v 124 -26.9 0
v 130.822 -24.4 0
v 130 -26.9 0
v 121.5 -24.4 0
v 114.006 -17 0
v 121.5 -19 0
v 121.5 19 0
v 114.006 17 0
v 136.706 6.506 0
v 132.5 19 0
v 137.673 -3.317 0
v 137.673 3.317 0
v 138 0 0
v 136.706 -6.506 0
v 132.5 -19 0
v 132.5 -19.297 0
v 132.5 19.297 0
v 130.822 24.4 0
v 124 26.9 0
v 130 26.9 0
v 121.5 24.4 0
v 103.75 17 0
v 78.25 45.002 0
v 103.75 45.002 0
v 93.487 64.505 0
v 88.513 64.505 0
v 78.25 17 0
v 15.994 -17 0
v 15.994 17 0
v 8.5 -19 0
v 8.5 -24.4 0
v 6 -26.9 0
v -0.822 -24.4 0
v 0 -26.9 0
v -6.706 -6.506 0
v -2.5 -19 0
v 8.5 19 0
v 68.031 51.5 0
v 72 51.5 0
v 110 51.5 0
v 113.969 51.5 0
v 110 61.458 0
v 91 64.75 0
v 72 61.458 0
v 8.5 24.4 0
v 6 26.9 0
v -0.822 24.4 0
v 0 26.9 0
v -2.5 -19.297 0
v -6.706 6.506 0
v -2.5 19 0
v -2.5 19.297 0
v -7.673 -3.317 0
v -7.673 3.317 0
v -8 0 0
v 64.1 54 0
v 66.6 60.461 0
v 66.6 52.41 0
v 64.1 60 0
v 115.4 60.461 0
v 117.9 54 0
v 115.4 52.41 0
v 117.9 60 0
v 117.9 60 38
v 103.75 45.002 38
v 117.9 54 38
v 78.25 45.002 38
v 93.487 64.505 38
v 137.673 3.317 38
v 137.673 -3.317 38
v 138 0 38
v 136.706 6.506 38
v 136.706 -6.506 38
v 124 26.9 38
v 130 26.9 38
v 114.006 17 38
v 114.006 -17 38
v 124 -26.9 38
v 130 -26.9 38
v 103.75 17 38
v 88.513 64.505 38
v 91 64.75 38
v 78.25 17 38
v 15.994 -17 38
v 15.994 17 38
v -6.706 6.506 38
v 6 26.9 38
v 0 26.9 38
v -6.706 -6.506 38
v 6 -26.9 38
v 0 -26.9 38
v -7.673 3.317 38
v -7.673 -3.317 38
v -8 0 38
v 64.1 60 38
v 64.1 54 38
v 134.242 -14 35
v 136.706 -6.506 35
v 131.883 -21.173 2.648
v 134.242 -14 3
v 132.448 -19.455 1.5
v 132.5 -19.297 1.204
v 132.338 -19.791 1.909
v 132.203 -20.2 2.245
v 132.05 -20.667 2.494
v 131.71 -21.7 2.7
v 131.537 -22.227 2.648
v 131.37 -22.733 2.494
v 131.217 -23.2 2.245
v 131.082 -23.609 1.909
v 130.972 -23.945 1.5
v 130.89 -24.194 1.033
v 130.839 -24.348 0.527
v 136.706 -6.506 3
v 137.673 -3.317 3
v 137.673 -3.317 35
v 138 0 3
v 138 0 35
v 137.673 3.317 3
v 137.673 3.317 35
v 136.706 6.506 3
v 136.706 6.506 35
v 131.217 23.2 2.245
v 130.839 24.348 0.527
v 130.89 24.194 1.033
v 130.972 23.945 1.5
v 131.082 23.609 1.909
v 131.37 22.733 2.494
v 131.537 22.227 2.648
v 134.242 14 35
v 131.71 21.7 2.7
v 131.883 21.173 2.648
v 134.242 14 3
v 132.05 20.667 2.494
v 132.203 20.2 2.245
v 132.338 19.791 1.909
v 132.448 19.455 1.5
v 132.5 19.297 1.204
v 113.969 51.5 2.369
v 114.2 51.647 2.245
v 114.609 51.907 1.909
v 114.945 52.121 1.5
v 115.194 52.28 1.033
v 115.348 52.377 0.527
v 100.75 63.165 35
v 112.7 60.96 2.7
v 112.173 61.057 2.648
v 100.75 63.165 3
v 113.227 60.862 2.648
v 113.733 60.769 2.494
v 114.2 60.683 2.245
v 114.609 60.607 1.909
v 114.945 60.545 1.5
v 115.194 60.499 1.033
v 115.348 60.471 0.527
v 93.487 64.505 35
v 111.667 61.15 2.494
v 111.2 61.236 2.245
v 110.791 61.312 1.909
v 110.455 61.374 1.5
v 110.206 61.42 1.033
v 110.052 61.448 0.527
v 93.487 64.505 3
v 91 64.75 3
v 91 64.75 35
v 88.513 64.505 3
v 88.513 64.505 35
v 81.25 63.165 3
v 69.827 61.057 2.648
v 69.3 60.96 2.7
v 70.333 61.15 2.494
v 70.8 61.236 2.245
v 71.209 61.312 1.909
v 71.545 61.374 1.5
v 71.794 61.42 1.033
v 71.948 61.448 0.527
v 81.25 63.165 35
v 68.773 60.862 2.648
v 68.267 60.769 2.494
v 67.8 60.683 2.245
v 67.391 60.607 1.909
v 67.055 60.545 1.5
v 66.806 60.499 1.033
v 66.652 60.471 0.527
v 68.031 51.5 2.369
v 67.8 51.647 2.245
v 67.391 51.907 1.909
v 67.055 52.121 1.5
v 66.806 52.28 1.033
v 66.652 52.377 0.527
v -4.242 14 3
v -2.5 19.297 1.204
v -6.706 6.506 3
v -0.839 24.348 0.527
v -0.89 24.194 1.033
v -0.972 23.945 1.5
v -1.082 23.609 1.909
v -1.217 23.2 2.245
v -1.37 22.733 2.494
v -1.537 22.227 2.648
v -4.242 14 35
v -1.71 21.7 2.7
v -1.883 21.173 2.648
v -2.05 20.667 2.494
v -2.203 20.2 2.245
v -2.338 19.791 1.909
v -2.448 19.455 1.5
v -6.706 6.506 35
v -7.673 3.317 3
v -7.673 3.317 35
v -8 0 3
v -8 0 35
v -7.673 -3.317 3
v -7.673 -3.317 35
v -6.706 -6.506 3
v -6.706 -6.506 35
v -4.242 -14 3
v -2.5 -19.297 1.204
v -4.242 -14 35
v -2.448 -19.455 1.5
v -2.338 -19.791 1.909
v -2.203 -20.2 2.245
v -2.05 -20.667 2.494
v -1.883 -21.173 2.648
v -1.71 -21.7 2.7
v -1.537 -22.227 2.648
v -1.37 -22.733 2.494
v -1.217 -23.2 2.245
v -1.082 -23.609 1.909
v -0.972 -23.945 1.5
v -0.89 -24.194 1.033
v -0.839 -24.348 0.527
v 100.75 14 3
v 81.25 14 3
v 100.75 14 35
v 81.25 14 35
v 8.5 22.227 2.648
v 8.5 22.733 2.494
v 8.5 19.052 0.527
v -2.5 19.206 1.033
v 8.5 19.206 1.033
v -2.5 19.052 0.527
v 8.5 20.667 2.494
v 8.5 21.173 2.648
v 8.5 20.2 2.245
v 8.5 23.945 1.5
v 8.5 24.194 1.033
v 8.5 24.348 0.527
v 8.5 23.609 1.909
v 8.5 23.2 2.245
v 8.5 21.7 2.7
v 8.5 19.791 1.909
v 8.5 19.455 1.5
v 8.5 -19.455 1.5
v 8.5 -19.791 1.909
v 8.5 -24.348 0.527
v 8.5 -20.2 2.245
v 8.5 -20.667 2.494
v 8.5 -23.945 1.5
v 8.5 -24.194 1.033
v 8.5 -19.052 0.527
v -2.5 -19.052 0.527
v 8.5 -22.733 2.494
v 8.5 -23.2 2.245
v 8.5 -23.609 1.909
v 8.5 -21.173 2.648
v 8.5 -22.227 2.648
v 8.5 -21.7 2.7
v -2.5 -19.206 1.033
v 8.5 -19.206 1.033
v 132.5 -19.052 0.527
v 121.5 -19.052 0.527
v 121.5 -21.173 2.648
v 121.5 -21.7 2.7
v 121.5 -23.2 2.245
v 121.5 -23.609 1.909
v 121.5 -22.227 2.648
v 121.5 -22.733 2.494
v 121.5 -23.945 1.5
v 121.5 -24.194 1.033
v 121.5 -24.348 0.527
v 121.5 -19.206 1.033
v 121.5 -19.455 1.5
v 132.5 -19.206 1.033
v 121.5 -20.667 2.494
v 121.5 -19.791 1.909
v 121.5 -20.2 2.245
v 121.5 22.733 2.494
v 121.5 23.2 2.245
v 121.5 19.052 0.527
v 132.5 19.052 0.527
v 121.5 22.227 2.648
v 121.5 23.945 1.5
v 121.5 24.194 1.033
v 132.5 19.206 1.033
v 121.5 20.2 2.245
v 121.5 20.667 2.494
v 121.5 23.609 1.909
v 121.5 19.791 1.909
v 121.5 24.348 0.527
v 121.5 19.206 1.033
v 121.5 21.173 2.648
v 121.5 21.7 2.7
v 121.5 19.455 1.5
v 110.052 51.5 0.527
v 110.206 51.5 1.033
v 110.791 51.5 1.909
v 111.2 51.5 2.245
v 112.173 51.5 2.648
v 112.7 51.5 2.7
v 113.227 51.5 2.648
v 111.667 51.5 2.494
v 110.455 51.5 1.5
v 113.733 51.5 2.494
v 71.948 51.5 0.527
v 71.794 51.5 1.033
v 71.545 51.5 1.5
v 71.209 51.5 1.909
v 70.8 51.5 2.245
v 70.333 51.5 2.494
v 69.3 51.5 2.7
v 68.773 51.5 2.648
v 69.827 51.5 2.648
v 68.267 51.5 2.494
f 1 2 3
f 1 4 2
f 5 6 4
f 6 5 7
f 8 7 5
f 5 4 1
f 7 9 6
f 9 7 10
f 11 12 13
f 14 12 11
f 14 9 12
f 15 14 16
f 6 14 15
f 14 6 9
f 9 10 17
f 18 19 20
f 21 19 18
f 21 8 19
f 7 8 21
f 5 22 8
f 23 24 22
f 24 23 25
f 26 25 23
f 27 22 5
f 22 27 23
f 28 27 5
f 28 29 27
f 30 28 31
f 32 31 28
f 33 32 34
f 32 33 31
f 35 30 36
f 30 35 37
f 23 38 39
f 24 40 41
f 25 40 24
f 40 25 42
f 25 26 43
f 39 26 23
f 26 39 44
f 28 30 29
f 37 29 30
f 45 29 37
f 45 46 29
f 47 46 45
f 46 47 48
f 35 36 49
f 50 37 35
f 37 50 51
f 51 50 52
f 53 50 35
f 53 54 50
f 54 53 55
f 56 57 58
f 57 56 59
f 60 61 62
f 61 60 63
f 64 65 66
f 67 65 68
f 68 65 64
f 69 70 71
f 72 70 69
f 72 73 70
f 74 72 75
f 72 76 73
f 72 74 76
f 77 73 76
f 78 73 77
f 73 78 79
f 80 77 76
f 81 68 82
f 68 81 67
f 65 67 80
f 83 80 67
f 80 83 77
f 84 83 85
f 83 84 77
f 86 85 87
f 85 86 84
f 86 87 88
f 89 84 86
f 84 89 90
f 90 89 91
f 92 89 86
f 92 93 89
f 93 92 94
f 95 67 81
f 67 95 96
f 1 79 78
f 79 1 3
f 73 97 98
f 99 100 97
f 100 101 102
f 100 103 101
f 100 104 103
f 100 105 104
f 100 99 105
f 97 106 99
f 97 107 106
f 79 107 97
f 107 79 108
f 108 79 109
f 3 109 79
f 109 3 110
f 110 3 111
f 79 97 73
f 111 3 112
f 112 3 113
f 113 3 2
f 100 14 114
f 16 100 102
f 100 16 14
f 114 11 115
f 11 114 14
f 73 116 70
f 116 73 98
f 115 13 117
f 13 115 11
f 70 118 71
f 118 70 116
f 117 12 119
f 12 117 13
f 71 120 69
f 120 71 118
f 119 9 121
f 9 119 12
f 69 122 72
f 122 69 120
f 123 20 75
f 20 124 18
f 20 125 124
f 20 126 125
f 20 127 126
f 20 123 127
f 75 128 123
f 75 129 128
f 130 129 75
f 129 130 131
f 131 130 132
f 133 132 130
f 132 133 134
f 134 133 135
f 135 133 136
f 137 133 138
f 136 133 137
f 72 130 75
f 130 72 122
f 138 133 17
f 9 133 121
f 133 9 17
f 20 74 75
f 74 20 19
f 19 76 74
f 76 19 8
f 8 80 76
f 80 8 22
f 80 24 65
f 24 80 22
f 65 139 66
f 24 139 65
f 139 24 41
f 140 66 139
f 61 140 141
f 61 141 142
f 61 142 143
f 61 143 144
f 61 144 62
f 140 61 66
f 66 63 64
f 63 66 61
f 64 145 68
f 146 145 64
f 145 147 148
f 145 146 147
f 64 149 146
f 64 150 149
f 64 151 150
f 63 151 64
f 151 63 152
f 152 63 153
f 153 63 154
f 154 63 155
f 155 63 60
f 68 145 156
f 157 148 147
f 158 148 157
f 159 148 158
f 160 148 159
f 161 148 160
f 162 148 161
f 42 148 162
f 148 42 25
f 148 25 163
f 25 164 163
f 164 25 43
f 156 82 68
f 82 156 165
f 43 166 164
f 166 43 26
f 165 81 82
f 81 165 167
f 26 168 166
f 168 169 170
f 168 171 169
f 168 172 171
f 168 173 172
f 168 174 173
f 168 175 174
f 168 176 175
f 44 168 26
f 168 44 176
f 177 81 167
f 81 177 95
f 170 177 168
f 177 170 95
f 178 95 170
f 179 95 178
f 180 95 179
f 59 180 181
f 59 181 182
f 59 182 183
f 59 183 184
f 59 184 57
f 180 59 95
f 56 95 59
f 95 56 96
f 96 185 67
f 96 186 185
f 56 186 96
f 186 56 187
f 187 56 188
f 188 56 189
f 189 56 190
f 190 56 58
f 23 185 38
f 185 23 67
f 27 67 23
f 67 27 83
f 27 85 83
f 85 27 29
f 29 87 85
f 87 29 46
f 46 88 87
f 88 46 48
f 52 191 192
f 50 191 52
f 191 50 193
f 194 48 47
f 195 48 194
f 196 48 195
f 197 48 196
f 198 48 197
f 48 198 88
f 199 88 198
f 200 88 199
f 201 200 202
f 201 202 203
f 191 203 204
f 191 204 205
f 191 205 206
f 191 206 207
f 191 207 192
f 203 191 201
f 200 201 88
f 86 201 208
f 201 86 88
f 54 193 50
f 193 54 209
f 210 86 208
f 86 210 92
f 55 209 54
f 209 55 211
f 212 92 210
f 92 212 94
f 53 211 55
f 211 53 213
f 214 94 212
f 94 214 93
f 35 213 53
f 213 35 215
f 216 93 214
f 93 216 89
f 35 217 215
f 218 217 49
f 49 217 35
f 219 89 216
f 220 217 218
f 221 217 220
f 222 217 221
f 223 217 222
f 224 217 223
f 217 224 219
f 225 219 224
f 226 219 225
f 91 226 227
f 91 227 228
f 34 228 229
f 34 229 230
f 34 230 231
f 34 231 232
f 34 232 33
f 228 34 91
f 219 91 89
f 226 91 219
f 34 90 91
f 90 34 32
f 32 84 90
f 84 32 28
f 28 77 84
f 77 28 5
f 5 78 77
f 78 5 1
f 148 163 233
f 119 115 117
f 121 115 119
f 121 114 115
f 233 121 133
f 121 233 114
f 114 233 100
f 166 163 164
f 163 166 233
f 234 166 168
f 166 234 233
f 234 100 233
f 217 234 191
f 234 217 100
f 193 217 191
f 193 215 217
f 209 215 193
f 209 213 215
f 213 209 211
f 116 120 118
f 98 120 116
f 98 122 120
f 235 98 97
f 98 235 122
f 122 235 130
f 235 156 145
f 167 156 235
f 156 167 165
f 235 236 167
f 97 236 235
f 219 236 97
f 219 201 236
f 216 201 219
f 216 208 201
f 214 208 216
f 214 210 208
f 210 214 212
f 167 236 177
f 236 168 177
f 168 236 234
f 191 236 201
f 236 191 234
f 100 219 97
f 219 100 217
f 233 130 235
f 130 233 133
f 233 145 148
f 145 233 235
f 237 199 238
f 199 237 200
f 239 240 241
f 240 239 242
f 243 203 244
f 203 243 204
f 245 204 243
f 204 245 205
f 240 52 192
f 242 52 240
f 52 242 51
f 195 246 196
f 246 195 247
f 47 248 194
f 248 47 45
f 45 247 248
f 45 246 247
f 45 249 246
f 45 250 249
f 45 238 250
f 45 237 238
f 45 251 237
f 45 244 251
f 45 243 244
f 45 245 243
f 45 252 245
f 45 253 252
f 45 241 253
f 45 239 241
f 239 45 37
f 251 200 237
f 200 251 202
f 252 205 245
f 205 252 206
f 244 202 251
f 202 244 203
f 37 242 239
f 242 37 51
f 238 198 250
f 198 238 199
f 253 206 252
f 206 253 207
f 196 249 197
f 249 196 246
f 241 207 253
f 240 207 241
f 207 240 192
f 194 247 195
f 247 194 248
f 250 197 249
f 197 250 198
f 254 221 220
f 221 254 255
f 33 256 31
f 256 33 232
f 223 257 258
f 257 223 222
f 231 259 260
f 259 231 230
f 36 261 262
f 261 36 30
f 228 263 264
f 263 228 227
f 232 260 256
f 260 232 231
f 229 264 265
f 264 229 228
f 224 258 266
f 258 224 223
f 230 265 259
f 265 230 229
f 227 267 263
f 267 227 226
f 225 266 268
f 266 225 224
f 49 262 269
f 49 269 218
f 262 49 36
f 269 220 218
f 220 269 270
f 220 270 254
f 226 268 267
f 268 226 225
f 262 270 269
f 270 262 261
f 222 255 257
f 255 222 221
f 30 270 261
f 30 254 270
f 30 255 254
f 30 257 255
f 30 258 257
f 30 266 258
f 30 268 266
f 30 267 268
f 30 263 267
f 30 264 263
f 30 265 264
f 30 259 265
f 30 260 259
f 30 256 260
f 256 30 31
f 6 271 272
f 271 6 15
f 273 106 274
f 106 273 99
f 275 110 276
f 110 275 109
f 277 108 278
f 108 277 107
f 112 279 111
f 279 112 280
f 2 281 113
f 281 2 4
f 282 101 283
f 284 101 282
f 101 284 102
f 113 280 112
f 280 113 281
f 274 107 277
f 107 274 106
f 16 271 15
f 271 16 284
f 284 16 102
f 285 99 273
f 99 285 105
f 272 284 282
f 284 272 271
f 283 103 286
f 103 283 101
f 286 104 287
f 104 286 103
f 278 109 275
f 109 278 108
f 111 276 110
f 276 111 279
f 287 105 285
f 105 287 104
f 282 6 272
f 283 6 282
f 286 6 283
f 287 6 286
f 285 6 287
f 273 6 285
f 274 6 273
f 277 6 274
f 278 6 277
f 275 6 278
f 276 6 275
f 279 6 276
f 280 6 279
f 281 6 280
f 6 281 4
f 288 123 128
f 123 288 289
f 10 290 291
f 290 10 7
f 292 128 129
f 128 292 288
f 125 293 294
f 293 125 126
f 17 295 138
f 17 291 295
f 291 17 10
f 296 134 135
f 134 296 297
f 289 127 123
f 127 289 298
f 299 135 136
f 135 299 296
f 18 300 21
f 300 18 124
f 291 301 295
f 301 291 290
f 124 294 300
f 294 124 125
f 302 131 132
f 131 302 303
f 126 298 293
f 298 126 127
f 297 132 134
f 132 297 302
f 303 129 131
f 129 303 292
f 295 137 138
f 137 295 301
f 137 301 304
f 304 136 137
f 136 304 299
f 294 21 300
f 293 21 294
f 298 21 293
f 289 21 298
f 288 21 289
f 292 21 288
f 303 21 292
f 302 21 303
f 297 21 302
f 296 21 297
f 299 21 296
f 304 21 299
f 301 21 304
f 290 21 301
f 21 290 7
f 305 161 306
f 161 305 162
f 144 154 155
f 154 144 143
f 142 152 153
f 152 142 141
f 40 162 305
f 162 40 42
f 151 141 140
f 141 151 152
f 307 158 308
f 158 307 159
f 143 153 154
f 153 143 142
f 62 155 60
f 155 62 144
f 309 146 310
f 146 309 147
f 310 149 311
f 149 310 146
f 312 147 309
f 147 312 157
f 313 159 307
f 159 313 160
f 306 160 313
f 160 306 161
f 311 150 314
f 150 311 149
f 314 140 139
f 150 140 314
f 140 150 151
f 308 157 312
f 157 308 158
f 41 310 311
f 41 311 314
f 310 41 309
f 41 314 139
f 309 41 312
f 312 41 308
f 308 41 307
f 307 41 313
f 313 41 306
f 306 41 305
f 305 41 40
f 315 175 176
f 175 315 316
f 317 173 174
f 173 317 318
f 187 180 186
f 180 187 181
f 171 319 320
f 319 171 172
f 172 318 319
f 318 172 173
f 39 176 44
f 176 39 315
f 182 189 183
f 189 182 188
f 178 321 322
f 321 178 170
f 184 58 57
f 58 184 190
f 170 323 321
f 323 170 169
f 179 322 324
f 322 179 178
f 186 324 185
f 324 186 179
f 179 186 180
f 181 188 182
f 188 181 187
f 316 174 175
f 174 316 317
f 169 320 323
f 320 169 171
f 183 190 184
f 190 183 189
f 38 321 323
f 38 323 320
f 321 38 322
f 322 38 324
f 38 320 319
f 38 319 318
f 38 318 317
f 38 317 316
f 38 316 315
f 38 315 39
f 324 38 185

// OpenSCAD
$fn = 32;

// ----------------------------------------------------------------------
// Air duct: 34 mm duct, 3 mm wall, 38 mm across
// ----------------------------------------------------------------------

// --- parameters (mm) ---
duct_r = 17;              // duct core radius
duct_d = 34;              // duct core diameter
wall = 3;                 // duct wall thickness
height = 38;              // duct width (extrusion height)
port_r = 26.9;            // port flange half width
port_d = 53.8;            // port flange width
port_t = 6;               // port flange thickness
bolt_d = 5.4;             // port bolt holes
bolt_offset = 21.7;       // bolt hole offset from the port axis
branch_r = 12.75;         // branch core radius
branch_d = 25.5;          // branch core diameter
branch_len = 60;          // branch length from the run axis

difference() {
  /* outer hull chain: tube with a flat flange plate at every port */
  linear_extrude(height = 38) {
    hull() {
      polygon([[0, -26.9], [0, 26.9], [6, 26.9], [6, -26.9]]);
      translate([9, 0]) circle(r = 17);
    }
    hull() {
      translate([9, 0]) circle(r = 17);
      translate([39, 0]) circle(r = 17);
    }
    hull() {
      translate([39, 0]) circle(r = 17);
      translate([91, 0]) circle(r = 17);
    }
    hull() {
      translate([91, 0]) circle(r = 17);
      translate([121, 0]) circle(r = 17);
    }
    hull() {
      translate([121, 0]) circle(r = 17);
      polygon([[130, 26.9], [130, -26.9], [124, -26.9], [124, 26.9]]);
    }
    hull() {
      translate([91, 0]) circle(r = 12.75);
      translate([91, 33]) circle(r = 12.75);
    }
    hull() {
      translate([91, 33]) circle(r = 12.75);
      translate([91, 52]) circle(r = 12.75);
    }
    hull() {
      translate([91, 52]) circle(r = 12.75);
      polygon([[64.1, 60], [117.9, 60], [117.9, 54], [64.1, 54]]);
    }
  }
  /* air passage: the same chain inset by the wall, 5 mm proud of the ports */
  translate([0, 0, 3]) linear_extrude(height = 32) {
    hull() {
      translate([-5, 0]) circle(r = 14);
      translate([39, 0]) circle(r = 14);
    }
    hull() {
      translate([39, 0]) circle(r = 14);
      translate([91, 0]) circle(r = 14);
    }
    hull() {
      translate([91, 0]) circle(r = 14);
      translate([135, 0]) circle(r = 14);
    }
    hull() {
      translate([91, 0]) circle(r = 9.75);
      translate([91, 33]) circle(r = 9.75);
    }
    hull() {
      translate([91, 33]) circle(r = 9.75);
      translate([91, 65]) circle(r = 9.75);
    }
  }
  translate([0, 0]) rotate([0, 0, -90]) translate([-21.7, -2.5]) rotate([-90, 0, 0]) cylinder(h = 11, d = 5.4);
  translate([0, 0]) rotate([0, 0, -90]) translate([21.7, -2.5]) rotate([-90, 0, 0]) cylinder(h = 11, d = 5.4);
  translate([130, 0]) rotate([0, 0, 90]) translate([-21.7, -2.5]) rotate([-90, 0, 0]) cylinder(h = 11, d = 5.4);
  translate([130, 0]) rotate([0, 0, 90]) translate([21.7, -2.5]) rotate([-90, 0, 0]) cylinder(h = 11, d = 5.4);
  translate([91, 60]) rotate([0, 0, 180]) translate([-21.7, -2.5]) rotate([-90, 0, 0]) cylinder(h = 11, d = 5.4);
  translate([91, 60]) rotate([0, 0, 180]) translate([21.7, -2.5]) rotate([-90, 0, 0]) cylinder(h = 11, d = 5.4);
}
